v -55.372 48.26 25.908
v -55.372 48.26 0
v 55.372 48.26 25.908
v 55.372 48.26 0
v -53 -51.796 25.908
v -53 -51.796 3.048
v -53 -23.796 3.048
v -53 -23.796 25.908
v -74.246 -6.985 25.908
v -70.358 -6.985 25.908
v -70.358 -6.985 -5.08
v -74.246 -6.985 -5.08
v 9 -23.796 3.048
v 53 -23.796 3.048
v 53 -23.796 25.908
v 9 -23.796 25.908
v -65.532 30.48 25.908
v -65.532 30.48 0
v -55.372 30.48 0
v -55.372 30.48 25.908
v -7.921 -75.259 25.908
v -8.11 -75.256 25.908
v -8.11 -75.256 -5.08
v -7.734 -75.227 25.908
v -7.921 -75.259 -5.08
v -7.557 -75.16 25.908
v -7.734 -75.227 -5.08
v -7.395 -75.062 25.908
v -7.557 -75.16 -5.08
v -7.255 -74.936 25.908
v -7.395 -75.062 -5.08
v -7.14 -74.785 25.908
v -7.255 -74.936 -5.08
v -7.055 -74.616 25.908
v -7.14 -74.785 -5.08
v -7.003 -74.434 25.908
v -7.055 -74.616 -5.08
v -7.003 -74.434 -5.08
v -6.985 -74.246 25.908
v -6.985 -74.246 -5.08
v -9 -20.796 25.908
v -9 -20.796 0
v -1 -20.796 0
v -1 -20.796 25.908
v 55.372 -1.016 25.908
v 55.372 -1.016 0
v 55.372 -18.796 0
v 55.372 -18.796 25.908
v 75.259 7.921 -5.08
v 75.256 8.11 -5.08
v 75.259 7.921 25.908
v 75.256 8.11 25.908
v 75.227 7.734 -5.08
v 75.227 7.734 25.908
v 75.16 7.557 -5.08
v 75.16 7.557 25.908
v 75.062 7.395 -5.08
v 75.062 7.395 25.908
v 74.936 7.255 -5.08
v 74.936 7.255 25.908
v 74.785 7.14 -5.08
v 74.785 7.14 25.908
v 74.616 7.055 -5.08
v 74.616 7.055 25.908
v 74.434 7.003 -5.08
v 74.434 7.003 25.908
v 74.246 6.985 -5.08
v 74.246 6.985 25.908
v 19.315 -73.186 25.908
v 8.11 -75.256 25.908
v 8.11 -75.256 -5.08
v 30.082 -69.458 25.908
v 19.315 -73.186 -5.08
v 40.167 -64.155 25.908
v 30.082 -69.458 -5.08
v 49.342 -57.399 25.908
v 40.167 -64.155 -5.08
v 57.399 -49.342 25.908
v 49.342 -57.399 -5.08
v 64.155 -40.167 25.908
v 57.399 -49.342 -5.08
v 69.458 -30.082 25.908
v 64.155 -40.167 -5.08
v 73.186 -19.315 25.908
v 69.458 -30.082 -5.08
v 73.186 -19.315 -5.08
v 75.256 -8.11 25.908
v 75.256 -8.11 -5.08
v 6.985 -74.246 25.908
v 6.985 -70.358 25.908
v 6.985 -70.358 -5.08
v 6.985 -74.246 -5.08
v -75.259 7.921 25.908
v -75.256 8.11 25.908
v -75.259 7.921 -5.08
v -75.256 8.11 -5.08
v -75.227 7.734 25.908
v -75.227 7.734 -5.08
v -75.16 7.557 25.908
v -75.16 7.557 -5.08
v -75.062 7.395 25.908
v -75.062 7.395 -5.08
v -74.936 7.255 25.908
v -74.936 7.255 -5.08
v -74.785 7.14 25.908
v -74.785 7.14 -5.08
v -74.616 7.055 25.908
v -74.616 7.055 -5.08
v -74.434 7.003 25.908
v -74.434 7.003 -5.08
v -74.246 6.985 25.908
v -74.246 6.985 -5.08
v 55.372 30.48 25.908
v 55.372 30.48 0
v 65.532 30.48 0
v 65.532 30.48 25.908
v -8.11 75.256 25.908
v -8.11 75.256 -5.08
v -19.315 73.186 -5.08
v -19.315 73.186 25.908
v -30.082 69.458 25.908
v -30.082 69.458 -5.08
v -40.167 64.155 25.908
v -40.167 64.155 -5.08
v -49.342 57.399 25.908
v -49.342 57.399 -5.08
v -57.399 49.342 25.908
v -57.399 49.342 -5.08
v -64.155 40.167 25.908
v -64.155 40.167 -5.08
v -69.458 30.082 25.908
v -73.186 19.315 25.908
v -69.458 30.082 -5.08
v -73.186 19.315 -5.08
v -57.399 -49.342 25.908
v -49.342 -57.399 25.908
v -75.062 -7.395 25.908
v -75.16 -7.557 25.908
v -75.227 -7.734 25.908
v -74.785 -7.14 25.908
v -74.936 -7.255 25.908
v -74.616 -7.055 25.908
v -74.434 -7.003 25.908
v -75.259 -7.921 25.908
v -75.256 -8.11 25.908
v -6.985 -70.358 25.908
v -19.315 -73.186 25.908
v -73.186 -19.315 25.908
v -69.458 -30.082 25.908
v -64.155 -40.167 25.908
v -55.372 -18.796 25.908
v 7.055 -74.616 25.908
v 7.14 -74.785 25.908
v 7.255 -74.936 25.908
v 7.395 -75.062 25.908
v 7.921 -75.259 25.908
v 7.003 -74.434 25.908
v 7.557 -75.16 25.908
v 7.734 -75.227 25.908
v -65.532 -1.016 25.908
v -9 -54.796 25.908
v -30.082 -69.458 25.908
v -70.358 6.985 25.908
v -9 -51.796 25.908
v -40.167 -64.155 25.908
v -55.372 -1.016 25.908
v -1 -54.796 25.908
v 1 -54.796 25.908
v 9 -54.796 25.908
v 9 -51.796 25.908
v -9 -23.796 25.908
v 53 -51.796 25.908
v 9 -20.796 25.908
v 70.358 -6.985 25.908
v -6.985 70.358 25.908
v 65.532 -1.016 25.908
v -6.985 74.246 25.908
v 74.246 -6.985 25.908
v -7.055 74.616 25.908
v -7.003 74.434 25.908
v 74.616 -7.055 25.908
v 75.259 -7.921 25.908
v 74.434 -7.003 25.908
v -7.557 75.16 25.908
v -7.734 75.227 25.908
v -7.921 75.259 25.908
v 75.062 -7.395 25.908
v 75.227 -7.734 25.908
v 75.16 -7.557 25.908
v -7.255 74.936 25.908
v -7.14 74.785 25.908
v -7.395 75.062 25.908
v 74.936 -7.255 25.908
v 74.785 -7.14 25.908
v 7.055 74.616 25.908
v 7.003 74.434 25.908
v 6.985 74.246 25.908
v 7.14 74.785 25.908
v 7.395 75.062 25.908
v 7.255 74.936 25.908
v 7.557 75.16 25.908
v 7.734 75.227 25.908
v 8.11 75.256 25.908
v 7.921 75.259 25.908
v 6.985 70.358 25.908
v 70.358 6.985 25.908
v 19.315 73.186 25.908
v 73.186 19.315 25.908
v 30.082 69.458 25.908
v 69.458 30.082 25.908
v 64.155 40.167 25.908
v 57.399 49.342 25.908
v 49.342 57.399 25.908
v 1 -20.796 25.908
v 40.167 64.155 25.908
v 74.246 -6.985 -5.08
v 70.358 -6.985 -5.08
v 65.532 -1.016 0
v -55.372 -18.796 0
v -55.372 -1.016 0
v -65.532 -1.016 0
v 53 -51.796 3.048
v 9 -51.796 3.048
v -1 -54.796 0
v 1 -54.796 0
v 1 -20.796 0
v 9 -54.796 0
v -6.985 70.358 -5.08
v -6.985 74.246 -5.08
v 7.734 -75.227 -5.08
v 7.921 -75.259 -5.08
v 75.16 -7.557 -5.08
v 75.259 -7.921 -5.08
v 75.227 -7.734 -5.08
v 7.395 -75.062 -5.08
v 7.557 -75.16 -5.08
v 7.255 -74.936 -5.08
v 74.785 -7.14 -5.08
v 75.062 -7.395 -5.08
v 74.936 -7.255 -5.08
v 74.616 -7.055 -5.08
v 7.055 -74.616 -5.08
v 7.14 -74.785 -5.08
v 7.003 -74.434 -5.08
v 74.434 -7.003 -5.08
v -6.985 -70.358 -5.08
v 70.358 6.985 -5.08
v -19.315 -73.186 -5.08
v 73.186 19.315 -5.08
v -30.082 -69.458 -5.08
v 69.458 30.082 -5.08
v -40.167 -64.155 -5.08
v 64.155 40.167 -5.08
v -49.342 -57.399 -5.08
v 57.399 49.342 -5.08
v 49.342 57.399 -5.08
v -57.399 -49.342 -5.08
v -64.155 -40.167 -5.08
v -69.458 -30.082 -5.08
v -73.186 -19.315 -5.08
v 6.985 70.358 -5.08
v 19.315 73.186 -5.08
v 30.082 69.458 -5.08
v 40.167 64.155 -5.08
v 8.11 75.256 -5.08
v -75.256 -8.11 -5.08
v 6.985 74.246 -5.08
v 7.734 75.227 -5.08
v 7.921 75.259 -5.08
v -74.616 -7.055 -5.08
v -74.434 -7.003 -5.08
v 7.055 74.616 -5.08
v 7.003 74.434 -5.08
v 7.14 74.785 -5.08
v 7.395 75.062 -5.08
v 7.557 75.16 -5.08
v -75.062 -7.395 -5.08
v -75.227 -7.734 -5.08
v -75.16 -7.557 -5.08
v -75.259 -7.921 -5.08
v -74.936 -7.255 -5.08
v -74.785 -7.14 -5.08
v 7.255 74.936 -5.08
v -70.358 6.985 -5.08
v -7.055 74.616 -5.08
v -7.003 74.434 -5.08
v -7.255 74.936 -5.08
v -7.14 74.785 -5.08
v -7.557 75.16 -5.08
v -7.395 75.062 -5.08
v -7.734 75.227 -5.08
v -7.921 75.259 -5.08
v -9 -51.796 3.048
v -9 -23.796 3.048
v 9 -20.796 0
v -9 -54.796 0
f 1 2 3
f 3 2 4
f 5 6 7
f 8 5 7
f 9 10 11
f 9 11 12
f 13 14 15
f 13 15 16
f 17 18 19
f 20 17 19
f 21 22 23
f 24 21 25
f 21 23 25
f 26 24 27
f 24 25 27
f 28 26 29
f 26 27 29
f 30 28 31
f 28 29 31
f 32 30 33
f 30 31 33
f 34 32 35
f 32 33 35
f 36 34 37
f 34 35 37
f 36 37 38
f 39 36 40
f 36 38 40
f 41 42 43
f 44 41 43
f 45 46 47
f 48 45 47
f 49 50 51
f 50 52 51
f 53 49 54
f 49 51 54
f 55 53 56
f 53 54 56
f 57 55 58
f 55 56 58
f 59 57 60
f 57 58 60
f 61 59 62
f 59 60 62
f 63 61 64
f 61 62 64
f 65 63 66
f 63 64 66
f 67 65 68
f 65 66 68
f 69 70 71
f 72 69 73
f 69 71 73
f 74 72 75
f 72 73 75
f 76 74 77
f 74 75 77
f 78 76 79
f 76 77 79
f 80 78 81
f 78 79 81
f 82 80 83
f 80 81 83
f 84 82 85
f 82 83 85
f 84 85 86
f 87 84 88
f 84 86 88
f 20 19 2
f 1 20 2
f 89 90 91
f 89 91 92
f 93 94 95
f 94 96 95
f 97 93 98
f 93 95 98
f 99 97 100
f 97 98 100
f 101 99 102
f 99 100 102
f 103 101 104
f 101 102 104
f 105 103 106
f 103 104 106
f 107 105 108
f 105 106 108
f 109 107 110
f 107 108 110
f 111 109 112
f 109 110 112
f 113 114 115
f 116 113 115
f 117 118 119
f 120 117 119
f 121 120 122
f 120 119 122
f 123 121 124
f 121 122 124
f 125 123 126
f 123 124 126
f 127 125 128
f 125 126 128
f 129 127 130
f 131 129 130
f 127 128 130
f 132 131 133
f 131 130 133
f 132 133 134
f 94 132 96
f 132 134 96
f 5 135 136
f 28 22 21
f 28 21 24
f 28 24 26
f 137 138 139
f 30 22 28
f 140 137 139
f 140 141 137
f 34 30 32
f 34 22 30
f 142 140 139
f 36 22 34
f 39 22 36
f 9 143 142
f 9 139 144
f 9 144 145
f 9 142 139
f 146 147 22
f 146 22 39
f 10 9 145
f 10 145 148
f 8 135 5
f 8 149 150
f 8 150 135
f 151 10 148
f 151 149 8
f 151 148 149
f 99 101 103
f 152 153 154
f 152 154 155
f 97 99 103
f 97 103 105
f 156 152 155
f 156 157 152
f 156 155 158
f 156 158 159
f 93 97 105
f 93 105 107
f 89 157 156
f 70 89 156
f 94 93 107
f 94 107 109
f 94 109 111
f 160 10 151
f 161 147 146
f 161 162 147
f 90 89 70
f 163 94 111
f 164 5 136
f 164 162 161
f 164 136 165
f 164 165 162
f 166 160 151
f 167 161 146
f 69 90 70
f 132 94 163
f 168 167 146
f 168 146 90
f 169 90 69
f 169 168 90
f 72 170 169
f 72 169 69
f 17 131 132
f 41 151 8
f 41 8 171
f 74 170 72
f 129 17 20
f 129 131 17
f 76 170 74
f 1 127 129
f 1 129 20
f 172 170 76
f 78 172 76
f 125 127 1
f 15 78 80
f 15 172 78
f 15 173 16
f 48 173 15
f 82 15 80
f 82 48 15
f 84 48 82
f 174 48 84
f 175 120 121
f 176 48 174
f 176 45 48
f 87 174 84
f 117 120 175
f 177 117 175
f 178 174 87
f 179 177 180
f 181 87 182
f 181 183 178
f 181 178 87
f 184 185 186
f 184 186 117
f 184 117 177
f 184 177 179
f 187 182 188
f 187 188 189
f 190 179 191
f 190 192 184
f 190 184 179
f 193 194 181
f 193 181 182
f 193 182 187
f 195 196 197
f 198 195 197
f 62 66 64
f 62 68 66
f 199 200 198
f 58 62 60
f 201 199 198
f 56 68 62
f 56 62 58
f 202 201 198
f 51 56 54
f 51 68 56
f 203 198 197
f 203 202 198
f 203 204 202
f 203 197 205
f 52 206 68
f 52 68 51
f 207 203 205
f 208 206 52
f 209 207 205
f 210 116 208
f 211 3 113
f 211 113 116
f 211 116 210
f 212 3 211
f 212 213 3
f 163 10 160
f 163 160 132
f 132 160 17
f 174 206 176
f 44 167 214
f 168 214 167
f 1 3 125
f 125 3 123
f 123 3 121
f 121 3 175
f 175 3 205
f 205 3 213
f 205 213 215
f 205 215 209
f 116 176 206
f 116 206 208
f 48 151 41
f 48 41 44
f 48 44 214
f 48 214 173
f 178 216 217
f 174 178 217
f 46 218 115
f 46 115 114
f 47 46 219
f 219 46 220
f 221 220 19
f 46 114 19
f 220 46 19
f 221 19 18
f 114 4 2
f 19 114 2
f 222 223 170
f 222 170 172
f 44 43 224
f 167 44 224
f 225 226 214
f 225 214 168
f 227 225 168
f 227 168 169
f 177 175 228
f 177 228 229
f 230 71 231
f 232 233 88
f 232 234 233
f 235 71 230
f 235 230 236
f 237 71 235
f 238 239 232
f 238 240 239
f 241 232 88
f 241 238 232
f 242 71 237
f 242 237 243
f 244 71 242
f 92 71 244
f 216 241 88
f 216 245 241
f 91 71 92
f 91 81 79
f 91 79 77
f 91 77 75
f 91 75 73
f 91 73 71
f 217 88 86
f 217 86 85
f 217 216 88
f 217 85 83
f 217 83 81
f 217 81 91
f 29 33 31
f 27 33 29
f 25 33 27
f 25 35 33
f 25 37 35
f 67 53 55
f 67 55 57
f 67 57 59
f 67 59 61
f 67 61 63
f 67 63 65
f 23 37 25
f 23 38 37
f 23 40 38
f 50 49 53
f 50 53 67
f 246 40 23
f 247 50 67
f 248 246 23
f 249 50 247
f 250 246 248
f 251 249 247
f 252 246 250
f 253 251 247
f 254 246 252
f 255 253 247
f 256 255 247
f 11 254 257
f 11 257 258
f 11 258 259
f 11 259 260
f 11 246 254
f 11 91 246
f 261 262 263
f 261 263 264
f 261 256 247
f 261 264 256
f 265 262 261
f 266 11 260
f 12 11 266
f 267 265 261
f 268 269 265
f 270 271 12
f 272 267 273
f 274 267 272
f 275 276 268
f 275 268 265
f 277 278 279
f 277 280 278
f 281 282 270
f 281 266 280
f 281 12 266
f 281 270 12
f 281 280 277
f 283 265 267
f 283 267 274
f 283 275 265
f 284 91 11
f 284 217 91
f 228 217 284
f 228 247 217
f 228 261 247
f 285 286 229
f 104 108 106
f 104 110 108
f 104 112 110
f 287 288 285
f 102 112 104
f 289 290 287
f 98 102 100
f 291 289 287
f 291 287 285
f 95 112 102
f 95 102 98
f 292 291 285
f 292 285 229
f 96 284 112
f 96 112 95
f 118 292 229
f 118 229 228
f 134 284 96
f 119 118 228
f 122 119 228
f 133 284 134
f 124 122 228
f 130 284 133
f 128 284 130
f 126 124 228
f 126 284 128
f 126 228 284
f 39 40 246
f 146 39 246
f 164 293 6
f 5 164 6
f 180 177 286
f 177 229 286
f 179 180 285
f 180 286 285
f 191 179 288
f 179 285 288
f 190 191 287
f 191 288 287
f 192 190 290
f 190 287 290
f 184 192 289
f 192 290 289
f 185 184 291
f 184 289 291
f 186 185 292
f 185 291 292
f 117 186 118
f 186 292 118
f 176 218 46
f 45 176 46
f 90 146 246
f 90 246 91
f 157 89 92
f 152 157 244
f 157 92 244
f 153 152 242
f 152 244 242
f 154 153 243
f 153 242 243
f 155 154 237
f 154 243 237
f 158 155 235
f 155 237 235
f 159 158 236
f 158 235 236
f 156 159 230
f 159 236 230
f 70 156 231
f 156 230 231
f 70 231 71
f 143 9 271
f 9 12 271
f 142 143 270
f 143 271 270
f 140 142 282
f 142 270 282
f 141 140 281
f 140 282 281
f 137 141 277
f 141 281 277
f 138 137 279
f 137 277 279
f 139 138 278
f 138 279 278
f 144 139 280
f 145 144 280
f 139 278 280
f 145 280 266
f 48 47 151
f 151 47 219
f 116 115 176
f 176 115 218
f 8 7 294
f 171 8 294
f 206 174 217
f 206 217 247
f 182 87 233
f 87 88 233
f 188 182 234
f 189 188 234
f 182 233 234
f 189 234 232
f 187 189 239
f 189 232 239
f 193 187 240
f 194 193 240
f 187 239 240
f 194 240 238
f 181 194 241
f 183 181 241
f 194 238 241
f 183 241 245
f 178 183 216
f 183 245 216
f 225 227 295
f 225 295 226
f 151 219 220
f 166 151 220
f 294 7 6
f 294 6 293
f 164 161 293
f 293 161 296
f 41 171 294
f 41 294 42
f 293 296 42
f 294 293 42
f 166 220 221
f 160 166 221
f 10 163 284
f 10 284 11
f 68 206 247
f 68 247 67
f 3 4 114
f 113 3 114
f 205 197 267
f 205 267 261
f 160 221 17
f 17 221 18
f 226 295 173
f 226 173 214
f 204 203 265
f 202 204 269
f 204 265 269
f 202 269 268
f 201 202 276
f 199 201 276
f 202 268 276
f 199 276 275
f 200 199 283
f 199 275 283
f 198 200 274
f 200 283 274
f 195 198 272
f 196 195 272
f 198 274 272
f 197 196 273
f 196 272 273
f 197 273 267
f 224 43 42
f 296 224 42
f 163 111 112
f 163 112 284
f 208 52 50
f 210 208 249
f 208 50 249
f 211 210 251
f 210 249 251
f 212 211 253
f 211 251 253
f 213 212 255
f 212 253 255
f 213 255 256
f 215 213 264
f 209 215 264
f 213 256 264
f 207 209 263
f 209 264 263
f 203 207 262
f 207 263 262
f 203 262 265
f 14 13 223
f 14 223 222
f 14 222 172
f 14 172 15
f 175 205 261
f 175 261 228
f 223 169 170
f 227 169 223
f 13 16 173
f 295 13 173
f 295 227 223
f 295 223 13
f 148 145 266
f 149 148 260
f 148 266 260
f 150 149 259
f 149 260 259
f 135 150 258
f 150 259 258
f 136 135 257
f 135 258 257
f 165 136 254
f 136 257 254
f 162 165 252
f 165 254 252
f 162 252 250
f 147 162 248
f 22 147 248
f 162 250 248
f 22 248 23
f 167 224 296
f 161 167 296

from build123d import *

# Parameters (mm, degrees)
SKETCH2_R           = 75.692
BOSS_EXTRUDE1_DEPTH = 25.908
SKETCH3_R           = 75.692
BOSS_EXTRUDE2_DEPTH = 5.08
SKETCH4_W           = 44
SKETCH4_H           = 28
BOSS_EXTRUDE3_DEPTH = 3.048
CUT_EXTRUDE1_DEPTH  = 31.988
FILLET1_R           = 1.016


with BuildPart() as part:
    # Sketch2 → Boss-Extrude1 (new body)
    with BuildSketch(Plane.XY):
        Circle(SKETCH2_R)
        Polygon((-55.372, 48.26), (55.372, 48.26), (55.372, 30.48), (65.532, 30.48), (65.532, -1.016), (55.372, -1.016), (55.372, -18.796), (-55.372, -18.796), (-55.372, -1.016), (-65.532, -1.016), (-65.532, 30.48), (-55.372, 30.48), align=None, mode=Mode.SUBTRACT)
        Polygon((-53, -23.796), (-9, -23.796), (-9, -20.796), (-1, -20.796), (-1, -54.796), (-9, -54.796), (-9, -51.796), (-53, -51.796), align=None, mode=Mode.SUBTRACT)
        Polygon((53, -23.796), (9, -23.796), (9, -20.796), (1, -20.796), (1, -54.796), (9, -54.796), (9, -51.796), (53, -51.796), align=None, mode=Mode.SUBTRACT)
    extrude(amount=BOSS_EXTRUDE1_DEPTH)

    # Sketch3 → Boss-Extrude2 (add)
    with BuildSketch(Plane(origin=(0, 0, 0), x_dir=(-1, 0, 0), z_dir=(0, 0, -1))):
        Circle(SKETCH3_R)
    extrude(amount=BOSS_EXTRUDE2_DEPTH)

    # Sketch4 → Boss-Extrude3 (add)
    with BuildSketch(Plane.XY):
        with Locations((-31, -37.796)):
            Rectangle(SKETCH4_W, SKETCH4_H)
        with Locations((31, -37.796)):
            Rectangle(SKETCH4_W, SKETCH4_H)
    extrude(amount=BOSS_EXTRUDE3_DEPTH)

    # Sketch7 → Cut-Extrude1 (cut, through all)
    with BuildSketch(Plane.XY.offset(25.908)):
        with BuildLine():
            Line((6.985, 70.358), (-6.985, 70.358))
            Line((-6.985, 70.358), (-6.985, 75.369016439))
            ThreePointArc((-6.985, 75.369016439), (0, 75.692), (6.985, 75.369016439))
            Line((6.985, 75.369016439), (6.985, 70.358))
        make_face()
        with BuildLine():
            Line((70.358, -6.985), (70.358, 6.985))
            Line((70.358, 6.985), (75.369016439, 6.985))
            ThreePointArc((75.369016439, 6.985), (75.692, 0), (75.369016439, -6.985))
            Line((75.369016439, -6.985), (70.358, -6.985))
        make_face()
        with BuildLine():
            Line((-6.985, -70.358), (6.985, -70.358))
            Line((6.985, -70.358), (6.985, -75.369016439))
            ThreePointArc((6.985, -75.369016439), (0, -75.692), (-6.985, -75.369016439))
            Line((-6.985, -75.369016439), (-6.985, -70.358))
        make_face()
        with BuildLine():
            Line((-70.358, 6.985), (-70.358, -6.985))
            Line((-70.358, -6.985), (-75.369016439, -6.985))
            ThreePointArc((-75.369016439, -6.985), (-75.692, 0), (-75.369016439, 6.985))
            Line((-75.369016439, 6.985), (-70.358, 6.985))
        make_face()
    extrude(amount=-CUT_EXTRUDE1_DEPTH, mode=Mode.SUBTRACT)

    # Fillet1
    fillet1_edges = [part.edges().sort_by_distance(p)[0] for p in [
        (6.985, 75.369016439, 10.414),
        (-6.985, 75.369016439, 10.414),
        (75.369016439, -6.985, 10.414),
        (75.369016439, 6.985, 10.414),
        (-6.985, -75.369016439, 10.414),
        (6.985, -75.369016439, 10.414),
        (-75.369016439, 6.985, 10.414),
        (-75.369016439, -6.985, 10.414),
    ]]
    fillet(fillet1_edges, radius=FILLET1_R)


solid = part.part
